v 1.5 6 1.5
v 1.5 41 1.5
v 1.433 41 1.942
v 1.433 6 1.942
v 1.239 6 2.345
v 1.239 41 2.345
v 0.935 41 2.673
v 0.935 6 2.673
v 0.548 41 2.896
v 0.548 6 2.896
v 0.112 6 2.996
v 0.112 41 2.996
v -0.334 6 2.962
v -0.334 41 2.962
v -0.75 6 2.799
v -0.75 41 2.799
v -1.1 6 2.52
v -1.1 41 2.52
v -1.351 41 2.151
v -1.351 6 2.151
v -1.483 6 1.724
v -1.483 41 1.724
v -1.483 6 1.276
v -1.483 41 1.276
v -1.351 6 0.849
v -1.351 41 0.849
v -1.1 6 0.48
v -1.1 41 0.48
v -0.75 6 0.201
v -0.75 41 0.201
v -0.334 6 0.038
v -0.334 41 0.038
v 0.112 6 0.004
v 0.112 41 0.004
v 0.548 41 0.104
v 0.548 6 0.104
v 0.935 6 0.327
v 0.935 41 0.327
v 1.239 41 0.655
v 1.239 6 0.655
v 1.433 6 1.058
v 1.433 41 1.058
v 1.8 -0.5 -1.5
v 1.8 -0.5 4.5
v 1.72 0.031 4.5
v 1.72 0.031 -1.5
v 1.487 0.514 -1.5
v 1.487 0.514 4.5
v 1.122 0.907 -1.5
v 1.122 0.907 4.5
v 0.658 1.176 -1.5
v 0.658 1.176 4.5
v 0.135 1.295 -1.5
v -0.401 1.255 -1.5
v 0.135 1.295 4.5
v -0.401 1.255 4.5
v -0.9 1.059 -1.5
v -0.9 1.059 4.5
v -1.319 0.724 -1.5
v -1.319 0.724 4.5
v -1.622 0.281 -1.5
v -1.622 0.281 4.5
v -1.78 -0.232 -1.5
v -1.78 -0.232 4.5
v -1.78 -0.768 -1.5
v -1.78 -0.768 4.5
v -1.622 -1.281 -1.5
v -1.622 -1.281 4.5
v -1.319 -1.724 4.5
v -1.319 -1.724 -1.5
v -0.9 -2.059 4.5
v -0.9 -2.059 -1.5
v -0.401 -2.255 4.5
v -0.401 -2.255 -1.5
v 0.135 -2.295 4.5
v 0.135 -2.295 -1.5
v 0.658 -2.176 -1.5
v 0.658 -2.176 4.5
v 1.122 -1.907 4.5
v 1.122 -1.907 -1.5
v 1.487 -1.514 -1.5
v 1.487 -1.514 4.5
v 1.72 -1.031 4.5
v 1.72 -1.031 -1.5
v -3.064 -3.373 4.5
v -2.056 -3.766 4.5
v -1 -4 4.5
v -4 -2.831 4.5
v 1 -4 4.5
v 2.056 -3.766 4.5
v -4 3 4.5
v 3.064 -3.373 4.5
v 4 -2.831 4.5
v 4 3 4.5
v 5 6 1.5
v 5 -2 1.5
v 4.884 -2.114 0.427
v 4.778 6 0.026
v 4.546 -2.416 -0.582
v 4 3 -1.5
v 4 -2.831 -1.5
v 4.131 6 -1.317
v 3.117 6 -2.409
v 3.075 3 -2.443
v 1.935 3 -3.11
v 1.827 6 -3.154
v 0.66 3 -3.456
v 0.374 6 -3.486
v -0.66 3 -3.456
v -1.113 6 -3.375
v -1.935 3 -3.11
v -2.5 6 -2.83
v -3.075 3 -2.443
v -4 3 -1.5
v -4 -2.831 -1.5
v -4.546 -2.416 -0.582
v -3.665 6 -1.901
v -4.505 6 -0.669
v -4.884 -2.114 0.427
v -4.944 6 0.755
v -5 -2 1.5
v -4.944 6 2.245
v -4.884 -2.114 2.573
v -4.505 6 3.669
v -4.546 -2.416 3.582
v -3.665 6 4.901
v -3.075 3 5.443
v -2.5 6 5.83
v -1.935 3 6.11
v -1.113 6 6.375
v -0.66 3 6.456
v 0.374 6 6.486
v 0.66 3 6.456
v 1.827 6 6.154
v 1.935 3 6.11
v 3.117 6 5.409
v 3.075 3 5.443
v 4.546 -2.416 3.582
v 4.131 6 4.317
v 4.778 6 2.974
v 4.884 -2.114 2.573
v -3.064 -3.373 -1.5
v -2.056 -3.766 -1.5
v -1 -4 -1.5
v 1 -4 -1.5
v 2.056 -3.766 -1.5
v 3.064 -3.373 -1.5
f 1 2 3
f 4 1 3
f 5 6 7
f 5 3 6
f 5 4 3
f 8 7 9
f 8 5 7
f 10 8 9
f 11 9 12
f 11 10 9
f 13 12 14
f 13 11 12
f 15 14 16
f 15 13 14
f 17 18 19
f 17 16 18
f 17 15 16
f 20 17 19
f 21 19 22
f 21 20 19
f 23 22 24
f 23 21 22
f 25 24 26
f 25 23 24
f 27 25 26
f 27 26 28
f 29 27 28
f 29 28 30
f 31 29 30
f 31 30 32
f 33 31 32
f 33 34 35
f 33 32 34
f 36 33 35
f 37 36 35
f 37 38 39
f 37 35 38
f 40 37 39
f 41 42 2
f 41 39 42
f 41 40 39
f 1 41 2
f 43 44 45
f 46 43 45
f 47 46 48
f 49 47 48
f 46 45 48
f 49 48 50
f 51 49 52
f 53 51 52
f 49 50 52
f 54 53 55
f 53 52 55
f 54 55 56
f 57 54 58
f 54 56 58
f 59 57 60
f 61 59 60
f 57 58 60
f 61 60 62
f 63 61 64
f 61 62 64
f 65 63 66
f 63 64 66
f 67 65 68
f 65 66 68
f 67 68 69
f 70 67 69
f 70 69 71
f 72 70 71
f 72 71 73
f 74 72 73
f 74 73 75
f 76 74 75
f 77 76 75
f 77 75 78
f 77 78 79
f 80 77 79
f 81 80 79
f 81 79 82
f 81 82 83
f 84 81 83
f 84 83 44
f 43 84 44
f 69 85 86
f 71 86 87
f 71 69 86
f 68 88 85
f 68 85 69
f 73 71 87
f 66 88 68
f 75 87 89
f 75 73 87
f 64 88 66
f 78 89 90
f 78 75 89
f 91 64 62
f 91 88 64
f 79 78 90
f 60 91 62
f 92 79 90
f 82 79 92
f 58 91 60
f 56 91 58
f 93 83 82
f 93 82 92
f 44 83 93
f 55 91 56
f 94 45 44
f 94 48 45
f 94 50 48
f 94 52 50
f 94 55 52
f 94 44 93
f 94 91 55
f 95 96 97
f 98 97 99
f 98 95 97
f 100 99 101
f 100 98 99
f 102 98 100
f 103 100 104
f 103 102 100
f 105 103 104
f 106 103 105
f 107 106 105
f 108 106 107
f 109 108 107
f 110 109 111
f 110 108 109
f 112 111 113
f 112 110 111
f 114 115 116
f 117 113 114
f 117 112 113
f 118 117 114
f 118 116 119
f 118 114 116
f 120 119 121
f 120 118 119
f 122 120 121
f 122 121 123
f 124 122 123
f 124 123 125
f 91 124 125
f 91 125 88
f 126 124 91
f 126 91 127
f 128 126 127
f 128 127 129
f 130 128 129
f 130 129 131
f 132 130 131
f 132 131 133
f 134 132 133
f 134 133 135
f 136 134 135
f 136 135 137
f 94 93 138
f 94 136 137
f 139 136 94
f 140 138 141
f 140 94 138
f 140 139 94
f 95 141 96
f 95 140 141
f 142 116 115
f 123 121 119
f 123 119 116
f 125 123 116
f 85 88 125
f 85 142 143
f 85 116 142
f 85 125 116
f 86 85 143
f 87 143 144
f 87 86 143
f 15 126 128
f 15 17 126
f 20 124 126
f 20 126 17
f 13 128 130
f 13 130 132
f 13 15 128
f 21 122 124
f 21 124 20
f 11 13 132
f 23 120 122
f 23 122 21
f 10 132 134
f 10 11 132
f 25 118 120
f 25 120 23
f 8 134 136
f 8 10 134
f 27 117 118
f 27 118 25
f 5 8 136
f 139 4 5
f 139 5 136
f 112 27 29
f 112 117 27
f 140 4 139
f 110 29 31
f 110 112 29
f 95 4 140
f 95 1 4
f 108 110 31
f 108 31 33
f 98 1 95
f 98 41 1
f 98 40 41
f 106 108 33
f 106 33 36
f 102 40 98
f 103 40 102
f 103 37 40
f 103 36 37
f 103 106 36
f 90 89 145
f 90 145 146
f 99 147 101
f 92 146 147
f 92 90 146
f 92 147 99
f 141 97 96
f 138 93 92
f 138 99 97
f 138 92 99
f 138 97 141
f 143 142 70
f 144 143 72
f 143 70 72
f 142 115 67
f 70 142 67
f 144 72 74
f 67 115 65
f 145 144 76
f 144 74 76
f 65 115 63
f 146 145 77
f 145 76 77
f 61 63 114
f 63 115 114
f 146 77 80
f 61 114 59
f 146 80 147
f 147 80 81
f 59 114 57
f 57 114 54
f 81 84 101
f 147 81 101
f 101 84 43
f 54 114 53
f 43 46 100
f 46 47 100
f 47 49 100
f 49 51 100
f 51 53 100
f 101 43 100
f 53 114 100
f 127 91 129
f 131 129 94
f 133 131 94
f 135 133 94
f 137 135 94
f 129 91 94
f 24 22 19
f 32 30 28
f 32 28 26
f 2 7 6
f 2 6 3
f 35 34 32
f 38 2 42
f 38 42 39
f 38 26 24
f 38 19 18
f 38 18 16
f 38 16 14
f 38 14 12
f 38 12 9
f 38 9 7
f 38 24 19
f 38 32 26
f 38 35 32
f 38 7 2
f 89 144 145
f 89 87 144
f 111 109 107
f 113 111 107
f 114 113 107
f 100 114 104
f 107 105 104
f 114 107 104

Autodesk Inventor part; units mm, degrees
ref_plane "YZ Plane" through (0, 0, 0) normal (1, 0, 0) x (0, 1, 0)
ref_plane "XZ Plane" through (0, 0, 0) normal (0, 1, 0) x (-1, 0, 0)
ref_plane "Work Plane1" through (-2.5, 3, 0) normal (0, 1, 0) x (1, 0, 0)
sketch "草圖8" plane through (-2.5, 3, 0) normal (0, 1, 0) x (1, 0, 0)
  circle A0 centre (2.5, -1.5) radius 5
  point P0 (2.5, 0)
  point P1 (2.5, 0)
  dimension "d26" = 10
extrude "擠出6" add sketch "草圖8" along normal blind 3
sketch "草圖9" plane through (0, 6, 1.5) normal (0, 1, 0) x (1, 0, 0)
  circle A0 centre (0, 0) radius 1.5
  point P0 (0, 1.5)
  dimension "d29" = 3
extrude "擠出7" add sketch "草圖9" along normal blind 35
sketch "Sketch10" plane through (0, 3, 1.5) normal (0, -1, 0) x (1, 0, 0)
  line L0 (0, 0) -> (0, 3) construction
  circle A0 centre (0, 0) radius 5 projected
  line L1 (0, 3) -> (-4, 3)
  line L2 (0, 3) -> (4, 3)
  line L3 (0, 0) -> (0, -3) construction
  line L4 (0, -3) -> (-4, -3)
  line L5 (0, -3) -> (4, -3)
  point P0 (0, -1.5)
  dimension "d34" = 3
  dimension "d35" = 3
extrude "Extrusion8" add sketch "Sketch10" along normal blind 7 contours A0 L5 L4 L1 L2
sketch "Sketch11" plane through (-4, 3, 4.5) normal (0, 0, 1) x (1, 0, 0)
  line L0 (0, 0) -> (8, 0) construction
  line L1 (4, 0) -> (4, -3.5) construction
  circle A0 centre (4, -3.5) radius 1.8
  line L2 (-1, -7) -> (-1, 3) construction
  line L3 (-1, 0) -> (-1, -5) construction
  line L4 (9, -7) -> (9, 3) construction
  line L5 (9, 0) -> (9, -5) construction
  arc A1 (-1, -5) -> (9, -5) centre (4, 0) ccw
  line L6 (-1, -7) -> (0, -7) projected
  line L7 (-1, -5) -> (-1, -7)
  line L8 (8, -7) -> (9, -7) projected
  line L9 (9, -7) -> (9, -5)
  line L10 (-1, -7) -> (3, -7)
  line L11 (8, -7) -> (0, -7) projected
  line L12 (9, -7) -> (5, -7)
  point P0 (4, -3)
  dimension "d38" = 3.5
  dimension "d39" = 3.6
  dimension "d40" = 5
extrude "Extrusion9" cut sketch "Sketch11" against normal through all contours A0
extrude "Extrusion10" cut sketch "Sketch11" against normal blind 7 contours A1 L9 L8 L11 | A1 L10 L6 L7
equation "\"d41\" = d38"
properties part number "避震"
